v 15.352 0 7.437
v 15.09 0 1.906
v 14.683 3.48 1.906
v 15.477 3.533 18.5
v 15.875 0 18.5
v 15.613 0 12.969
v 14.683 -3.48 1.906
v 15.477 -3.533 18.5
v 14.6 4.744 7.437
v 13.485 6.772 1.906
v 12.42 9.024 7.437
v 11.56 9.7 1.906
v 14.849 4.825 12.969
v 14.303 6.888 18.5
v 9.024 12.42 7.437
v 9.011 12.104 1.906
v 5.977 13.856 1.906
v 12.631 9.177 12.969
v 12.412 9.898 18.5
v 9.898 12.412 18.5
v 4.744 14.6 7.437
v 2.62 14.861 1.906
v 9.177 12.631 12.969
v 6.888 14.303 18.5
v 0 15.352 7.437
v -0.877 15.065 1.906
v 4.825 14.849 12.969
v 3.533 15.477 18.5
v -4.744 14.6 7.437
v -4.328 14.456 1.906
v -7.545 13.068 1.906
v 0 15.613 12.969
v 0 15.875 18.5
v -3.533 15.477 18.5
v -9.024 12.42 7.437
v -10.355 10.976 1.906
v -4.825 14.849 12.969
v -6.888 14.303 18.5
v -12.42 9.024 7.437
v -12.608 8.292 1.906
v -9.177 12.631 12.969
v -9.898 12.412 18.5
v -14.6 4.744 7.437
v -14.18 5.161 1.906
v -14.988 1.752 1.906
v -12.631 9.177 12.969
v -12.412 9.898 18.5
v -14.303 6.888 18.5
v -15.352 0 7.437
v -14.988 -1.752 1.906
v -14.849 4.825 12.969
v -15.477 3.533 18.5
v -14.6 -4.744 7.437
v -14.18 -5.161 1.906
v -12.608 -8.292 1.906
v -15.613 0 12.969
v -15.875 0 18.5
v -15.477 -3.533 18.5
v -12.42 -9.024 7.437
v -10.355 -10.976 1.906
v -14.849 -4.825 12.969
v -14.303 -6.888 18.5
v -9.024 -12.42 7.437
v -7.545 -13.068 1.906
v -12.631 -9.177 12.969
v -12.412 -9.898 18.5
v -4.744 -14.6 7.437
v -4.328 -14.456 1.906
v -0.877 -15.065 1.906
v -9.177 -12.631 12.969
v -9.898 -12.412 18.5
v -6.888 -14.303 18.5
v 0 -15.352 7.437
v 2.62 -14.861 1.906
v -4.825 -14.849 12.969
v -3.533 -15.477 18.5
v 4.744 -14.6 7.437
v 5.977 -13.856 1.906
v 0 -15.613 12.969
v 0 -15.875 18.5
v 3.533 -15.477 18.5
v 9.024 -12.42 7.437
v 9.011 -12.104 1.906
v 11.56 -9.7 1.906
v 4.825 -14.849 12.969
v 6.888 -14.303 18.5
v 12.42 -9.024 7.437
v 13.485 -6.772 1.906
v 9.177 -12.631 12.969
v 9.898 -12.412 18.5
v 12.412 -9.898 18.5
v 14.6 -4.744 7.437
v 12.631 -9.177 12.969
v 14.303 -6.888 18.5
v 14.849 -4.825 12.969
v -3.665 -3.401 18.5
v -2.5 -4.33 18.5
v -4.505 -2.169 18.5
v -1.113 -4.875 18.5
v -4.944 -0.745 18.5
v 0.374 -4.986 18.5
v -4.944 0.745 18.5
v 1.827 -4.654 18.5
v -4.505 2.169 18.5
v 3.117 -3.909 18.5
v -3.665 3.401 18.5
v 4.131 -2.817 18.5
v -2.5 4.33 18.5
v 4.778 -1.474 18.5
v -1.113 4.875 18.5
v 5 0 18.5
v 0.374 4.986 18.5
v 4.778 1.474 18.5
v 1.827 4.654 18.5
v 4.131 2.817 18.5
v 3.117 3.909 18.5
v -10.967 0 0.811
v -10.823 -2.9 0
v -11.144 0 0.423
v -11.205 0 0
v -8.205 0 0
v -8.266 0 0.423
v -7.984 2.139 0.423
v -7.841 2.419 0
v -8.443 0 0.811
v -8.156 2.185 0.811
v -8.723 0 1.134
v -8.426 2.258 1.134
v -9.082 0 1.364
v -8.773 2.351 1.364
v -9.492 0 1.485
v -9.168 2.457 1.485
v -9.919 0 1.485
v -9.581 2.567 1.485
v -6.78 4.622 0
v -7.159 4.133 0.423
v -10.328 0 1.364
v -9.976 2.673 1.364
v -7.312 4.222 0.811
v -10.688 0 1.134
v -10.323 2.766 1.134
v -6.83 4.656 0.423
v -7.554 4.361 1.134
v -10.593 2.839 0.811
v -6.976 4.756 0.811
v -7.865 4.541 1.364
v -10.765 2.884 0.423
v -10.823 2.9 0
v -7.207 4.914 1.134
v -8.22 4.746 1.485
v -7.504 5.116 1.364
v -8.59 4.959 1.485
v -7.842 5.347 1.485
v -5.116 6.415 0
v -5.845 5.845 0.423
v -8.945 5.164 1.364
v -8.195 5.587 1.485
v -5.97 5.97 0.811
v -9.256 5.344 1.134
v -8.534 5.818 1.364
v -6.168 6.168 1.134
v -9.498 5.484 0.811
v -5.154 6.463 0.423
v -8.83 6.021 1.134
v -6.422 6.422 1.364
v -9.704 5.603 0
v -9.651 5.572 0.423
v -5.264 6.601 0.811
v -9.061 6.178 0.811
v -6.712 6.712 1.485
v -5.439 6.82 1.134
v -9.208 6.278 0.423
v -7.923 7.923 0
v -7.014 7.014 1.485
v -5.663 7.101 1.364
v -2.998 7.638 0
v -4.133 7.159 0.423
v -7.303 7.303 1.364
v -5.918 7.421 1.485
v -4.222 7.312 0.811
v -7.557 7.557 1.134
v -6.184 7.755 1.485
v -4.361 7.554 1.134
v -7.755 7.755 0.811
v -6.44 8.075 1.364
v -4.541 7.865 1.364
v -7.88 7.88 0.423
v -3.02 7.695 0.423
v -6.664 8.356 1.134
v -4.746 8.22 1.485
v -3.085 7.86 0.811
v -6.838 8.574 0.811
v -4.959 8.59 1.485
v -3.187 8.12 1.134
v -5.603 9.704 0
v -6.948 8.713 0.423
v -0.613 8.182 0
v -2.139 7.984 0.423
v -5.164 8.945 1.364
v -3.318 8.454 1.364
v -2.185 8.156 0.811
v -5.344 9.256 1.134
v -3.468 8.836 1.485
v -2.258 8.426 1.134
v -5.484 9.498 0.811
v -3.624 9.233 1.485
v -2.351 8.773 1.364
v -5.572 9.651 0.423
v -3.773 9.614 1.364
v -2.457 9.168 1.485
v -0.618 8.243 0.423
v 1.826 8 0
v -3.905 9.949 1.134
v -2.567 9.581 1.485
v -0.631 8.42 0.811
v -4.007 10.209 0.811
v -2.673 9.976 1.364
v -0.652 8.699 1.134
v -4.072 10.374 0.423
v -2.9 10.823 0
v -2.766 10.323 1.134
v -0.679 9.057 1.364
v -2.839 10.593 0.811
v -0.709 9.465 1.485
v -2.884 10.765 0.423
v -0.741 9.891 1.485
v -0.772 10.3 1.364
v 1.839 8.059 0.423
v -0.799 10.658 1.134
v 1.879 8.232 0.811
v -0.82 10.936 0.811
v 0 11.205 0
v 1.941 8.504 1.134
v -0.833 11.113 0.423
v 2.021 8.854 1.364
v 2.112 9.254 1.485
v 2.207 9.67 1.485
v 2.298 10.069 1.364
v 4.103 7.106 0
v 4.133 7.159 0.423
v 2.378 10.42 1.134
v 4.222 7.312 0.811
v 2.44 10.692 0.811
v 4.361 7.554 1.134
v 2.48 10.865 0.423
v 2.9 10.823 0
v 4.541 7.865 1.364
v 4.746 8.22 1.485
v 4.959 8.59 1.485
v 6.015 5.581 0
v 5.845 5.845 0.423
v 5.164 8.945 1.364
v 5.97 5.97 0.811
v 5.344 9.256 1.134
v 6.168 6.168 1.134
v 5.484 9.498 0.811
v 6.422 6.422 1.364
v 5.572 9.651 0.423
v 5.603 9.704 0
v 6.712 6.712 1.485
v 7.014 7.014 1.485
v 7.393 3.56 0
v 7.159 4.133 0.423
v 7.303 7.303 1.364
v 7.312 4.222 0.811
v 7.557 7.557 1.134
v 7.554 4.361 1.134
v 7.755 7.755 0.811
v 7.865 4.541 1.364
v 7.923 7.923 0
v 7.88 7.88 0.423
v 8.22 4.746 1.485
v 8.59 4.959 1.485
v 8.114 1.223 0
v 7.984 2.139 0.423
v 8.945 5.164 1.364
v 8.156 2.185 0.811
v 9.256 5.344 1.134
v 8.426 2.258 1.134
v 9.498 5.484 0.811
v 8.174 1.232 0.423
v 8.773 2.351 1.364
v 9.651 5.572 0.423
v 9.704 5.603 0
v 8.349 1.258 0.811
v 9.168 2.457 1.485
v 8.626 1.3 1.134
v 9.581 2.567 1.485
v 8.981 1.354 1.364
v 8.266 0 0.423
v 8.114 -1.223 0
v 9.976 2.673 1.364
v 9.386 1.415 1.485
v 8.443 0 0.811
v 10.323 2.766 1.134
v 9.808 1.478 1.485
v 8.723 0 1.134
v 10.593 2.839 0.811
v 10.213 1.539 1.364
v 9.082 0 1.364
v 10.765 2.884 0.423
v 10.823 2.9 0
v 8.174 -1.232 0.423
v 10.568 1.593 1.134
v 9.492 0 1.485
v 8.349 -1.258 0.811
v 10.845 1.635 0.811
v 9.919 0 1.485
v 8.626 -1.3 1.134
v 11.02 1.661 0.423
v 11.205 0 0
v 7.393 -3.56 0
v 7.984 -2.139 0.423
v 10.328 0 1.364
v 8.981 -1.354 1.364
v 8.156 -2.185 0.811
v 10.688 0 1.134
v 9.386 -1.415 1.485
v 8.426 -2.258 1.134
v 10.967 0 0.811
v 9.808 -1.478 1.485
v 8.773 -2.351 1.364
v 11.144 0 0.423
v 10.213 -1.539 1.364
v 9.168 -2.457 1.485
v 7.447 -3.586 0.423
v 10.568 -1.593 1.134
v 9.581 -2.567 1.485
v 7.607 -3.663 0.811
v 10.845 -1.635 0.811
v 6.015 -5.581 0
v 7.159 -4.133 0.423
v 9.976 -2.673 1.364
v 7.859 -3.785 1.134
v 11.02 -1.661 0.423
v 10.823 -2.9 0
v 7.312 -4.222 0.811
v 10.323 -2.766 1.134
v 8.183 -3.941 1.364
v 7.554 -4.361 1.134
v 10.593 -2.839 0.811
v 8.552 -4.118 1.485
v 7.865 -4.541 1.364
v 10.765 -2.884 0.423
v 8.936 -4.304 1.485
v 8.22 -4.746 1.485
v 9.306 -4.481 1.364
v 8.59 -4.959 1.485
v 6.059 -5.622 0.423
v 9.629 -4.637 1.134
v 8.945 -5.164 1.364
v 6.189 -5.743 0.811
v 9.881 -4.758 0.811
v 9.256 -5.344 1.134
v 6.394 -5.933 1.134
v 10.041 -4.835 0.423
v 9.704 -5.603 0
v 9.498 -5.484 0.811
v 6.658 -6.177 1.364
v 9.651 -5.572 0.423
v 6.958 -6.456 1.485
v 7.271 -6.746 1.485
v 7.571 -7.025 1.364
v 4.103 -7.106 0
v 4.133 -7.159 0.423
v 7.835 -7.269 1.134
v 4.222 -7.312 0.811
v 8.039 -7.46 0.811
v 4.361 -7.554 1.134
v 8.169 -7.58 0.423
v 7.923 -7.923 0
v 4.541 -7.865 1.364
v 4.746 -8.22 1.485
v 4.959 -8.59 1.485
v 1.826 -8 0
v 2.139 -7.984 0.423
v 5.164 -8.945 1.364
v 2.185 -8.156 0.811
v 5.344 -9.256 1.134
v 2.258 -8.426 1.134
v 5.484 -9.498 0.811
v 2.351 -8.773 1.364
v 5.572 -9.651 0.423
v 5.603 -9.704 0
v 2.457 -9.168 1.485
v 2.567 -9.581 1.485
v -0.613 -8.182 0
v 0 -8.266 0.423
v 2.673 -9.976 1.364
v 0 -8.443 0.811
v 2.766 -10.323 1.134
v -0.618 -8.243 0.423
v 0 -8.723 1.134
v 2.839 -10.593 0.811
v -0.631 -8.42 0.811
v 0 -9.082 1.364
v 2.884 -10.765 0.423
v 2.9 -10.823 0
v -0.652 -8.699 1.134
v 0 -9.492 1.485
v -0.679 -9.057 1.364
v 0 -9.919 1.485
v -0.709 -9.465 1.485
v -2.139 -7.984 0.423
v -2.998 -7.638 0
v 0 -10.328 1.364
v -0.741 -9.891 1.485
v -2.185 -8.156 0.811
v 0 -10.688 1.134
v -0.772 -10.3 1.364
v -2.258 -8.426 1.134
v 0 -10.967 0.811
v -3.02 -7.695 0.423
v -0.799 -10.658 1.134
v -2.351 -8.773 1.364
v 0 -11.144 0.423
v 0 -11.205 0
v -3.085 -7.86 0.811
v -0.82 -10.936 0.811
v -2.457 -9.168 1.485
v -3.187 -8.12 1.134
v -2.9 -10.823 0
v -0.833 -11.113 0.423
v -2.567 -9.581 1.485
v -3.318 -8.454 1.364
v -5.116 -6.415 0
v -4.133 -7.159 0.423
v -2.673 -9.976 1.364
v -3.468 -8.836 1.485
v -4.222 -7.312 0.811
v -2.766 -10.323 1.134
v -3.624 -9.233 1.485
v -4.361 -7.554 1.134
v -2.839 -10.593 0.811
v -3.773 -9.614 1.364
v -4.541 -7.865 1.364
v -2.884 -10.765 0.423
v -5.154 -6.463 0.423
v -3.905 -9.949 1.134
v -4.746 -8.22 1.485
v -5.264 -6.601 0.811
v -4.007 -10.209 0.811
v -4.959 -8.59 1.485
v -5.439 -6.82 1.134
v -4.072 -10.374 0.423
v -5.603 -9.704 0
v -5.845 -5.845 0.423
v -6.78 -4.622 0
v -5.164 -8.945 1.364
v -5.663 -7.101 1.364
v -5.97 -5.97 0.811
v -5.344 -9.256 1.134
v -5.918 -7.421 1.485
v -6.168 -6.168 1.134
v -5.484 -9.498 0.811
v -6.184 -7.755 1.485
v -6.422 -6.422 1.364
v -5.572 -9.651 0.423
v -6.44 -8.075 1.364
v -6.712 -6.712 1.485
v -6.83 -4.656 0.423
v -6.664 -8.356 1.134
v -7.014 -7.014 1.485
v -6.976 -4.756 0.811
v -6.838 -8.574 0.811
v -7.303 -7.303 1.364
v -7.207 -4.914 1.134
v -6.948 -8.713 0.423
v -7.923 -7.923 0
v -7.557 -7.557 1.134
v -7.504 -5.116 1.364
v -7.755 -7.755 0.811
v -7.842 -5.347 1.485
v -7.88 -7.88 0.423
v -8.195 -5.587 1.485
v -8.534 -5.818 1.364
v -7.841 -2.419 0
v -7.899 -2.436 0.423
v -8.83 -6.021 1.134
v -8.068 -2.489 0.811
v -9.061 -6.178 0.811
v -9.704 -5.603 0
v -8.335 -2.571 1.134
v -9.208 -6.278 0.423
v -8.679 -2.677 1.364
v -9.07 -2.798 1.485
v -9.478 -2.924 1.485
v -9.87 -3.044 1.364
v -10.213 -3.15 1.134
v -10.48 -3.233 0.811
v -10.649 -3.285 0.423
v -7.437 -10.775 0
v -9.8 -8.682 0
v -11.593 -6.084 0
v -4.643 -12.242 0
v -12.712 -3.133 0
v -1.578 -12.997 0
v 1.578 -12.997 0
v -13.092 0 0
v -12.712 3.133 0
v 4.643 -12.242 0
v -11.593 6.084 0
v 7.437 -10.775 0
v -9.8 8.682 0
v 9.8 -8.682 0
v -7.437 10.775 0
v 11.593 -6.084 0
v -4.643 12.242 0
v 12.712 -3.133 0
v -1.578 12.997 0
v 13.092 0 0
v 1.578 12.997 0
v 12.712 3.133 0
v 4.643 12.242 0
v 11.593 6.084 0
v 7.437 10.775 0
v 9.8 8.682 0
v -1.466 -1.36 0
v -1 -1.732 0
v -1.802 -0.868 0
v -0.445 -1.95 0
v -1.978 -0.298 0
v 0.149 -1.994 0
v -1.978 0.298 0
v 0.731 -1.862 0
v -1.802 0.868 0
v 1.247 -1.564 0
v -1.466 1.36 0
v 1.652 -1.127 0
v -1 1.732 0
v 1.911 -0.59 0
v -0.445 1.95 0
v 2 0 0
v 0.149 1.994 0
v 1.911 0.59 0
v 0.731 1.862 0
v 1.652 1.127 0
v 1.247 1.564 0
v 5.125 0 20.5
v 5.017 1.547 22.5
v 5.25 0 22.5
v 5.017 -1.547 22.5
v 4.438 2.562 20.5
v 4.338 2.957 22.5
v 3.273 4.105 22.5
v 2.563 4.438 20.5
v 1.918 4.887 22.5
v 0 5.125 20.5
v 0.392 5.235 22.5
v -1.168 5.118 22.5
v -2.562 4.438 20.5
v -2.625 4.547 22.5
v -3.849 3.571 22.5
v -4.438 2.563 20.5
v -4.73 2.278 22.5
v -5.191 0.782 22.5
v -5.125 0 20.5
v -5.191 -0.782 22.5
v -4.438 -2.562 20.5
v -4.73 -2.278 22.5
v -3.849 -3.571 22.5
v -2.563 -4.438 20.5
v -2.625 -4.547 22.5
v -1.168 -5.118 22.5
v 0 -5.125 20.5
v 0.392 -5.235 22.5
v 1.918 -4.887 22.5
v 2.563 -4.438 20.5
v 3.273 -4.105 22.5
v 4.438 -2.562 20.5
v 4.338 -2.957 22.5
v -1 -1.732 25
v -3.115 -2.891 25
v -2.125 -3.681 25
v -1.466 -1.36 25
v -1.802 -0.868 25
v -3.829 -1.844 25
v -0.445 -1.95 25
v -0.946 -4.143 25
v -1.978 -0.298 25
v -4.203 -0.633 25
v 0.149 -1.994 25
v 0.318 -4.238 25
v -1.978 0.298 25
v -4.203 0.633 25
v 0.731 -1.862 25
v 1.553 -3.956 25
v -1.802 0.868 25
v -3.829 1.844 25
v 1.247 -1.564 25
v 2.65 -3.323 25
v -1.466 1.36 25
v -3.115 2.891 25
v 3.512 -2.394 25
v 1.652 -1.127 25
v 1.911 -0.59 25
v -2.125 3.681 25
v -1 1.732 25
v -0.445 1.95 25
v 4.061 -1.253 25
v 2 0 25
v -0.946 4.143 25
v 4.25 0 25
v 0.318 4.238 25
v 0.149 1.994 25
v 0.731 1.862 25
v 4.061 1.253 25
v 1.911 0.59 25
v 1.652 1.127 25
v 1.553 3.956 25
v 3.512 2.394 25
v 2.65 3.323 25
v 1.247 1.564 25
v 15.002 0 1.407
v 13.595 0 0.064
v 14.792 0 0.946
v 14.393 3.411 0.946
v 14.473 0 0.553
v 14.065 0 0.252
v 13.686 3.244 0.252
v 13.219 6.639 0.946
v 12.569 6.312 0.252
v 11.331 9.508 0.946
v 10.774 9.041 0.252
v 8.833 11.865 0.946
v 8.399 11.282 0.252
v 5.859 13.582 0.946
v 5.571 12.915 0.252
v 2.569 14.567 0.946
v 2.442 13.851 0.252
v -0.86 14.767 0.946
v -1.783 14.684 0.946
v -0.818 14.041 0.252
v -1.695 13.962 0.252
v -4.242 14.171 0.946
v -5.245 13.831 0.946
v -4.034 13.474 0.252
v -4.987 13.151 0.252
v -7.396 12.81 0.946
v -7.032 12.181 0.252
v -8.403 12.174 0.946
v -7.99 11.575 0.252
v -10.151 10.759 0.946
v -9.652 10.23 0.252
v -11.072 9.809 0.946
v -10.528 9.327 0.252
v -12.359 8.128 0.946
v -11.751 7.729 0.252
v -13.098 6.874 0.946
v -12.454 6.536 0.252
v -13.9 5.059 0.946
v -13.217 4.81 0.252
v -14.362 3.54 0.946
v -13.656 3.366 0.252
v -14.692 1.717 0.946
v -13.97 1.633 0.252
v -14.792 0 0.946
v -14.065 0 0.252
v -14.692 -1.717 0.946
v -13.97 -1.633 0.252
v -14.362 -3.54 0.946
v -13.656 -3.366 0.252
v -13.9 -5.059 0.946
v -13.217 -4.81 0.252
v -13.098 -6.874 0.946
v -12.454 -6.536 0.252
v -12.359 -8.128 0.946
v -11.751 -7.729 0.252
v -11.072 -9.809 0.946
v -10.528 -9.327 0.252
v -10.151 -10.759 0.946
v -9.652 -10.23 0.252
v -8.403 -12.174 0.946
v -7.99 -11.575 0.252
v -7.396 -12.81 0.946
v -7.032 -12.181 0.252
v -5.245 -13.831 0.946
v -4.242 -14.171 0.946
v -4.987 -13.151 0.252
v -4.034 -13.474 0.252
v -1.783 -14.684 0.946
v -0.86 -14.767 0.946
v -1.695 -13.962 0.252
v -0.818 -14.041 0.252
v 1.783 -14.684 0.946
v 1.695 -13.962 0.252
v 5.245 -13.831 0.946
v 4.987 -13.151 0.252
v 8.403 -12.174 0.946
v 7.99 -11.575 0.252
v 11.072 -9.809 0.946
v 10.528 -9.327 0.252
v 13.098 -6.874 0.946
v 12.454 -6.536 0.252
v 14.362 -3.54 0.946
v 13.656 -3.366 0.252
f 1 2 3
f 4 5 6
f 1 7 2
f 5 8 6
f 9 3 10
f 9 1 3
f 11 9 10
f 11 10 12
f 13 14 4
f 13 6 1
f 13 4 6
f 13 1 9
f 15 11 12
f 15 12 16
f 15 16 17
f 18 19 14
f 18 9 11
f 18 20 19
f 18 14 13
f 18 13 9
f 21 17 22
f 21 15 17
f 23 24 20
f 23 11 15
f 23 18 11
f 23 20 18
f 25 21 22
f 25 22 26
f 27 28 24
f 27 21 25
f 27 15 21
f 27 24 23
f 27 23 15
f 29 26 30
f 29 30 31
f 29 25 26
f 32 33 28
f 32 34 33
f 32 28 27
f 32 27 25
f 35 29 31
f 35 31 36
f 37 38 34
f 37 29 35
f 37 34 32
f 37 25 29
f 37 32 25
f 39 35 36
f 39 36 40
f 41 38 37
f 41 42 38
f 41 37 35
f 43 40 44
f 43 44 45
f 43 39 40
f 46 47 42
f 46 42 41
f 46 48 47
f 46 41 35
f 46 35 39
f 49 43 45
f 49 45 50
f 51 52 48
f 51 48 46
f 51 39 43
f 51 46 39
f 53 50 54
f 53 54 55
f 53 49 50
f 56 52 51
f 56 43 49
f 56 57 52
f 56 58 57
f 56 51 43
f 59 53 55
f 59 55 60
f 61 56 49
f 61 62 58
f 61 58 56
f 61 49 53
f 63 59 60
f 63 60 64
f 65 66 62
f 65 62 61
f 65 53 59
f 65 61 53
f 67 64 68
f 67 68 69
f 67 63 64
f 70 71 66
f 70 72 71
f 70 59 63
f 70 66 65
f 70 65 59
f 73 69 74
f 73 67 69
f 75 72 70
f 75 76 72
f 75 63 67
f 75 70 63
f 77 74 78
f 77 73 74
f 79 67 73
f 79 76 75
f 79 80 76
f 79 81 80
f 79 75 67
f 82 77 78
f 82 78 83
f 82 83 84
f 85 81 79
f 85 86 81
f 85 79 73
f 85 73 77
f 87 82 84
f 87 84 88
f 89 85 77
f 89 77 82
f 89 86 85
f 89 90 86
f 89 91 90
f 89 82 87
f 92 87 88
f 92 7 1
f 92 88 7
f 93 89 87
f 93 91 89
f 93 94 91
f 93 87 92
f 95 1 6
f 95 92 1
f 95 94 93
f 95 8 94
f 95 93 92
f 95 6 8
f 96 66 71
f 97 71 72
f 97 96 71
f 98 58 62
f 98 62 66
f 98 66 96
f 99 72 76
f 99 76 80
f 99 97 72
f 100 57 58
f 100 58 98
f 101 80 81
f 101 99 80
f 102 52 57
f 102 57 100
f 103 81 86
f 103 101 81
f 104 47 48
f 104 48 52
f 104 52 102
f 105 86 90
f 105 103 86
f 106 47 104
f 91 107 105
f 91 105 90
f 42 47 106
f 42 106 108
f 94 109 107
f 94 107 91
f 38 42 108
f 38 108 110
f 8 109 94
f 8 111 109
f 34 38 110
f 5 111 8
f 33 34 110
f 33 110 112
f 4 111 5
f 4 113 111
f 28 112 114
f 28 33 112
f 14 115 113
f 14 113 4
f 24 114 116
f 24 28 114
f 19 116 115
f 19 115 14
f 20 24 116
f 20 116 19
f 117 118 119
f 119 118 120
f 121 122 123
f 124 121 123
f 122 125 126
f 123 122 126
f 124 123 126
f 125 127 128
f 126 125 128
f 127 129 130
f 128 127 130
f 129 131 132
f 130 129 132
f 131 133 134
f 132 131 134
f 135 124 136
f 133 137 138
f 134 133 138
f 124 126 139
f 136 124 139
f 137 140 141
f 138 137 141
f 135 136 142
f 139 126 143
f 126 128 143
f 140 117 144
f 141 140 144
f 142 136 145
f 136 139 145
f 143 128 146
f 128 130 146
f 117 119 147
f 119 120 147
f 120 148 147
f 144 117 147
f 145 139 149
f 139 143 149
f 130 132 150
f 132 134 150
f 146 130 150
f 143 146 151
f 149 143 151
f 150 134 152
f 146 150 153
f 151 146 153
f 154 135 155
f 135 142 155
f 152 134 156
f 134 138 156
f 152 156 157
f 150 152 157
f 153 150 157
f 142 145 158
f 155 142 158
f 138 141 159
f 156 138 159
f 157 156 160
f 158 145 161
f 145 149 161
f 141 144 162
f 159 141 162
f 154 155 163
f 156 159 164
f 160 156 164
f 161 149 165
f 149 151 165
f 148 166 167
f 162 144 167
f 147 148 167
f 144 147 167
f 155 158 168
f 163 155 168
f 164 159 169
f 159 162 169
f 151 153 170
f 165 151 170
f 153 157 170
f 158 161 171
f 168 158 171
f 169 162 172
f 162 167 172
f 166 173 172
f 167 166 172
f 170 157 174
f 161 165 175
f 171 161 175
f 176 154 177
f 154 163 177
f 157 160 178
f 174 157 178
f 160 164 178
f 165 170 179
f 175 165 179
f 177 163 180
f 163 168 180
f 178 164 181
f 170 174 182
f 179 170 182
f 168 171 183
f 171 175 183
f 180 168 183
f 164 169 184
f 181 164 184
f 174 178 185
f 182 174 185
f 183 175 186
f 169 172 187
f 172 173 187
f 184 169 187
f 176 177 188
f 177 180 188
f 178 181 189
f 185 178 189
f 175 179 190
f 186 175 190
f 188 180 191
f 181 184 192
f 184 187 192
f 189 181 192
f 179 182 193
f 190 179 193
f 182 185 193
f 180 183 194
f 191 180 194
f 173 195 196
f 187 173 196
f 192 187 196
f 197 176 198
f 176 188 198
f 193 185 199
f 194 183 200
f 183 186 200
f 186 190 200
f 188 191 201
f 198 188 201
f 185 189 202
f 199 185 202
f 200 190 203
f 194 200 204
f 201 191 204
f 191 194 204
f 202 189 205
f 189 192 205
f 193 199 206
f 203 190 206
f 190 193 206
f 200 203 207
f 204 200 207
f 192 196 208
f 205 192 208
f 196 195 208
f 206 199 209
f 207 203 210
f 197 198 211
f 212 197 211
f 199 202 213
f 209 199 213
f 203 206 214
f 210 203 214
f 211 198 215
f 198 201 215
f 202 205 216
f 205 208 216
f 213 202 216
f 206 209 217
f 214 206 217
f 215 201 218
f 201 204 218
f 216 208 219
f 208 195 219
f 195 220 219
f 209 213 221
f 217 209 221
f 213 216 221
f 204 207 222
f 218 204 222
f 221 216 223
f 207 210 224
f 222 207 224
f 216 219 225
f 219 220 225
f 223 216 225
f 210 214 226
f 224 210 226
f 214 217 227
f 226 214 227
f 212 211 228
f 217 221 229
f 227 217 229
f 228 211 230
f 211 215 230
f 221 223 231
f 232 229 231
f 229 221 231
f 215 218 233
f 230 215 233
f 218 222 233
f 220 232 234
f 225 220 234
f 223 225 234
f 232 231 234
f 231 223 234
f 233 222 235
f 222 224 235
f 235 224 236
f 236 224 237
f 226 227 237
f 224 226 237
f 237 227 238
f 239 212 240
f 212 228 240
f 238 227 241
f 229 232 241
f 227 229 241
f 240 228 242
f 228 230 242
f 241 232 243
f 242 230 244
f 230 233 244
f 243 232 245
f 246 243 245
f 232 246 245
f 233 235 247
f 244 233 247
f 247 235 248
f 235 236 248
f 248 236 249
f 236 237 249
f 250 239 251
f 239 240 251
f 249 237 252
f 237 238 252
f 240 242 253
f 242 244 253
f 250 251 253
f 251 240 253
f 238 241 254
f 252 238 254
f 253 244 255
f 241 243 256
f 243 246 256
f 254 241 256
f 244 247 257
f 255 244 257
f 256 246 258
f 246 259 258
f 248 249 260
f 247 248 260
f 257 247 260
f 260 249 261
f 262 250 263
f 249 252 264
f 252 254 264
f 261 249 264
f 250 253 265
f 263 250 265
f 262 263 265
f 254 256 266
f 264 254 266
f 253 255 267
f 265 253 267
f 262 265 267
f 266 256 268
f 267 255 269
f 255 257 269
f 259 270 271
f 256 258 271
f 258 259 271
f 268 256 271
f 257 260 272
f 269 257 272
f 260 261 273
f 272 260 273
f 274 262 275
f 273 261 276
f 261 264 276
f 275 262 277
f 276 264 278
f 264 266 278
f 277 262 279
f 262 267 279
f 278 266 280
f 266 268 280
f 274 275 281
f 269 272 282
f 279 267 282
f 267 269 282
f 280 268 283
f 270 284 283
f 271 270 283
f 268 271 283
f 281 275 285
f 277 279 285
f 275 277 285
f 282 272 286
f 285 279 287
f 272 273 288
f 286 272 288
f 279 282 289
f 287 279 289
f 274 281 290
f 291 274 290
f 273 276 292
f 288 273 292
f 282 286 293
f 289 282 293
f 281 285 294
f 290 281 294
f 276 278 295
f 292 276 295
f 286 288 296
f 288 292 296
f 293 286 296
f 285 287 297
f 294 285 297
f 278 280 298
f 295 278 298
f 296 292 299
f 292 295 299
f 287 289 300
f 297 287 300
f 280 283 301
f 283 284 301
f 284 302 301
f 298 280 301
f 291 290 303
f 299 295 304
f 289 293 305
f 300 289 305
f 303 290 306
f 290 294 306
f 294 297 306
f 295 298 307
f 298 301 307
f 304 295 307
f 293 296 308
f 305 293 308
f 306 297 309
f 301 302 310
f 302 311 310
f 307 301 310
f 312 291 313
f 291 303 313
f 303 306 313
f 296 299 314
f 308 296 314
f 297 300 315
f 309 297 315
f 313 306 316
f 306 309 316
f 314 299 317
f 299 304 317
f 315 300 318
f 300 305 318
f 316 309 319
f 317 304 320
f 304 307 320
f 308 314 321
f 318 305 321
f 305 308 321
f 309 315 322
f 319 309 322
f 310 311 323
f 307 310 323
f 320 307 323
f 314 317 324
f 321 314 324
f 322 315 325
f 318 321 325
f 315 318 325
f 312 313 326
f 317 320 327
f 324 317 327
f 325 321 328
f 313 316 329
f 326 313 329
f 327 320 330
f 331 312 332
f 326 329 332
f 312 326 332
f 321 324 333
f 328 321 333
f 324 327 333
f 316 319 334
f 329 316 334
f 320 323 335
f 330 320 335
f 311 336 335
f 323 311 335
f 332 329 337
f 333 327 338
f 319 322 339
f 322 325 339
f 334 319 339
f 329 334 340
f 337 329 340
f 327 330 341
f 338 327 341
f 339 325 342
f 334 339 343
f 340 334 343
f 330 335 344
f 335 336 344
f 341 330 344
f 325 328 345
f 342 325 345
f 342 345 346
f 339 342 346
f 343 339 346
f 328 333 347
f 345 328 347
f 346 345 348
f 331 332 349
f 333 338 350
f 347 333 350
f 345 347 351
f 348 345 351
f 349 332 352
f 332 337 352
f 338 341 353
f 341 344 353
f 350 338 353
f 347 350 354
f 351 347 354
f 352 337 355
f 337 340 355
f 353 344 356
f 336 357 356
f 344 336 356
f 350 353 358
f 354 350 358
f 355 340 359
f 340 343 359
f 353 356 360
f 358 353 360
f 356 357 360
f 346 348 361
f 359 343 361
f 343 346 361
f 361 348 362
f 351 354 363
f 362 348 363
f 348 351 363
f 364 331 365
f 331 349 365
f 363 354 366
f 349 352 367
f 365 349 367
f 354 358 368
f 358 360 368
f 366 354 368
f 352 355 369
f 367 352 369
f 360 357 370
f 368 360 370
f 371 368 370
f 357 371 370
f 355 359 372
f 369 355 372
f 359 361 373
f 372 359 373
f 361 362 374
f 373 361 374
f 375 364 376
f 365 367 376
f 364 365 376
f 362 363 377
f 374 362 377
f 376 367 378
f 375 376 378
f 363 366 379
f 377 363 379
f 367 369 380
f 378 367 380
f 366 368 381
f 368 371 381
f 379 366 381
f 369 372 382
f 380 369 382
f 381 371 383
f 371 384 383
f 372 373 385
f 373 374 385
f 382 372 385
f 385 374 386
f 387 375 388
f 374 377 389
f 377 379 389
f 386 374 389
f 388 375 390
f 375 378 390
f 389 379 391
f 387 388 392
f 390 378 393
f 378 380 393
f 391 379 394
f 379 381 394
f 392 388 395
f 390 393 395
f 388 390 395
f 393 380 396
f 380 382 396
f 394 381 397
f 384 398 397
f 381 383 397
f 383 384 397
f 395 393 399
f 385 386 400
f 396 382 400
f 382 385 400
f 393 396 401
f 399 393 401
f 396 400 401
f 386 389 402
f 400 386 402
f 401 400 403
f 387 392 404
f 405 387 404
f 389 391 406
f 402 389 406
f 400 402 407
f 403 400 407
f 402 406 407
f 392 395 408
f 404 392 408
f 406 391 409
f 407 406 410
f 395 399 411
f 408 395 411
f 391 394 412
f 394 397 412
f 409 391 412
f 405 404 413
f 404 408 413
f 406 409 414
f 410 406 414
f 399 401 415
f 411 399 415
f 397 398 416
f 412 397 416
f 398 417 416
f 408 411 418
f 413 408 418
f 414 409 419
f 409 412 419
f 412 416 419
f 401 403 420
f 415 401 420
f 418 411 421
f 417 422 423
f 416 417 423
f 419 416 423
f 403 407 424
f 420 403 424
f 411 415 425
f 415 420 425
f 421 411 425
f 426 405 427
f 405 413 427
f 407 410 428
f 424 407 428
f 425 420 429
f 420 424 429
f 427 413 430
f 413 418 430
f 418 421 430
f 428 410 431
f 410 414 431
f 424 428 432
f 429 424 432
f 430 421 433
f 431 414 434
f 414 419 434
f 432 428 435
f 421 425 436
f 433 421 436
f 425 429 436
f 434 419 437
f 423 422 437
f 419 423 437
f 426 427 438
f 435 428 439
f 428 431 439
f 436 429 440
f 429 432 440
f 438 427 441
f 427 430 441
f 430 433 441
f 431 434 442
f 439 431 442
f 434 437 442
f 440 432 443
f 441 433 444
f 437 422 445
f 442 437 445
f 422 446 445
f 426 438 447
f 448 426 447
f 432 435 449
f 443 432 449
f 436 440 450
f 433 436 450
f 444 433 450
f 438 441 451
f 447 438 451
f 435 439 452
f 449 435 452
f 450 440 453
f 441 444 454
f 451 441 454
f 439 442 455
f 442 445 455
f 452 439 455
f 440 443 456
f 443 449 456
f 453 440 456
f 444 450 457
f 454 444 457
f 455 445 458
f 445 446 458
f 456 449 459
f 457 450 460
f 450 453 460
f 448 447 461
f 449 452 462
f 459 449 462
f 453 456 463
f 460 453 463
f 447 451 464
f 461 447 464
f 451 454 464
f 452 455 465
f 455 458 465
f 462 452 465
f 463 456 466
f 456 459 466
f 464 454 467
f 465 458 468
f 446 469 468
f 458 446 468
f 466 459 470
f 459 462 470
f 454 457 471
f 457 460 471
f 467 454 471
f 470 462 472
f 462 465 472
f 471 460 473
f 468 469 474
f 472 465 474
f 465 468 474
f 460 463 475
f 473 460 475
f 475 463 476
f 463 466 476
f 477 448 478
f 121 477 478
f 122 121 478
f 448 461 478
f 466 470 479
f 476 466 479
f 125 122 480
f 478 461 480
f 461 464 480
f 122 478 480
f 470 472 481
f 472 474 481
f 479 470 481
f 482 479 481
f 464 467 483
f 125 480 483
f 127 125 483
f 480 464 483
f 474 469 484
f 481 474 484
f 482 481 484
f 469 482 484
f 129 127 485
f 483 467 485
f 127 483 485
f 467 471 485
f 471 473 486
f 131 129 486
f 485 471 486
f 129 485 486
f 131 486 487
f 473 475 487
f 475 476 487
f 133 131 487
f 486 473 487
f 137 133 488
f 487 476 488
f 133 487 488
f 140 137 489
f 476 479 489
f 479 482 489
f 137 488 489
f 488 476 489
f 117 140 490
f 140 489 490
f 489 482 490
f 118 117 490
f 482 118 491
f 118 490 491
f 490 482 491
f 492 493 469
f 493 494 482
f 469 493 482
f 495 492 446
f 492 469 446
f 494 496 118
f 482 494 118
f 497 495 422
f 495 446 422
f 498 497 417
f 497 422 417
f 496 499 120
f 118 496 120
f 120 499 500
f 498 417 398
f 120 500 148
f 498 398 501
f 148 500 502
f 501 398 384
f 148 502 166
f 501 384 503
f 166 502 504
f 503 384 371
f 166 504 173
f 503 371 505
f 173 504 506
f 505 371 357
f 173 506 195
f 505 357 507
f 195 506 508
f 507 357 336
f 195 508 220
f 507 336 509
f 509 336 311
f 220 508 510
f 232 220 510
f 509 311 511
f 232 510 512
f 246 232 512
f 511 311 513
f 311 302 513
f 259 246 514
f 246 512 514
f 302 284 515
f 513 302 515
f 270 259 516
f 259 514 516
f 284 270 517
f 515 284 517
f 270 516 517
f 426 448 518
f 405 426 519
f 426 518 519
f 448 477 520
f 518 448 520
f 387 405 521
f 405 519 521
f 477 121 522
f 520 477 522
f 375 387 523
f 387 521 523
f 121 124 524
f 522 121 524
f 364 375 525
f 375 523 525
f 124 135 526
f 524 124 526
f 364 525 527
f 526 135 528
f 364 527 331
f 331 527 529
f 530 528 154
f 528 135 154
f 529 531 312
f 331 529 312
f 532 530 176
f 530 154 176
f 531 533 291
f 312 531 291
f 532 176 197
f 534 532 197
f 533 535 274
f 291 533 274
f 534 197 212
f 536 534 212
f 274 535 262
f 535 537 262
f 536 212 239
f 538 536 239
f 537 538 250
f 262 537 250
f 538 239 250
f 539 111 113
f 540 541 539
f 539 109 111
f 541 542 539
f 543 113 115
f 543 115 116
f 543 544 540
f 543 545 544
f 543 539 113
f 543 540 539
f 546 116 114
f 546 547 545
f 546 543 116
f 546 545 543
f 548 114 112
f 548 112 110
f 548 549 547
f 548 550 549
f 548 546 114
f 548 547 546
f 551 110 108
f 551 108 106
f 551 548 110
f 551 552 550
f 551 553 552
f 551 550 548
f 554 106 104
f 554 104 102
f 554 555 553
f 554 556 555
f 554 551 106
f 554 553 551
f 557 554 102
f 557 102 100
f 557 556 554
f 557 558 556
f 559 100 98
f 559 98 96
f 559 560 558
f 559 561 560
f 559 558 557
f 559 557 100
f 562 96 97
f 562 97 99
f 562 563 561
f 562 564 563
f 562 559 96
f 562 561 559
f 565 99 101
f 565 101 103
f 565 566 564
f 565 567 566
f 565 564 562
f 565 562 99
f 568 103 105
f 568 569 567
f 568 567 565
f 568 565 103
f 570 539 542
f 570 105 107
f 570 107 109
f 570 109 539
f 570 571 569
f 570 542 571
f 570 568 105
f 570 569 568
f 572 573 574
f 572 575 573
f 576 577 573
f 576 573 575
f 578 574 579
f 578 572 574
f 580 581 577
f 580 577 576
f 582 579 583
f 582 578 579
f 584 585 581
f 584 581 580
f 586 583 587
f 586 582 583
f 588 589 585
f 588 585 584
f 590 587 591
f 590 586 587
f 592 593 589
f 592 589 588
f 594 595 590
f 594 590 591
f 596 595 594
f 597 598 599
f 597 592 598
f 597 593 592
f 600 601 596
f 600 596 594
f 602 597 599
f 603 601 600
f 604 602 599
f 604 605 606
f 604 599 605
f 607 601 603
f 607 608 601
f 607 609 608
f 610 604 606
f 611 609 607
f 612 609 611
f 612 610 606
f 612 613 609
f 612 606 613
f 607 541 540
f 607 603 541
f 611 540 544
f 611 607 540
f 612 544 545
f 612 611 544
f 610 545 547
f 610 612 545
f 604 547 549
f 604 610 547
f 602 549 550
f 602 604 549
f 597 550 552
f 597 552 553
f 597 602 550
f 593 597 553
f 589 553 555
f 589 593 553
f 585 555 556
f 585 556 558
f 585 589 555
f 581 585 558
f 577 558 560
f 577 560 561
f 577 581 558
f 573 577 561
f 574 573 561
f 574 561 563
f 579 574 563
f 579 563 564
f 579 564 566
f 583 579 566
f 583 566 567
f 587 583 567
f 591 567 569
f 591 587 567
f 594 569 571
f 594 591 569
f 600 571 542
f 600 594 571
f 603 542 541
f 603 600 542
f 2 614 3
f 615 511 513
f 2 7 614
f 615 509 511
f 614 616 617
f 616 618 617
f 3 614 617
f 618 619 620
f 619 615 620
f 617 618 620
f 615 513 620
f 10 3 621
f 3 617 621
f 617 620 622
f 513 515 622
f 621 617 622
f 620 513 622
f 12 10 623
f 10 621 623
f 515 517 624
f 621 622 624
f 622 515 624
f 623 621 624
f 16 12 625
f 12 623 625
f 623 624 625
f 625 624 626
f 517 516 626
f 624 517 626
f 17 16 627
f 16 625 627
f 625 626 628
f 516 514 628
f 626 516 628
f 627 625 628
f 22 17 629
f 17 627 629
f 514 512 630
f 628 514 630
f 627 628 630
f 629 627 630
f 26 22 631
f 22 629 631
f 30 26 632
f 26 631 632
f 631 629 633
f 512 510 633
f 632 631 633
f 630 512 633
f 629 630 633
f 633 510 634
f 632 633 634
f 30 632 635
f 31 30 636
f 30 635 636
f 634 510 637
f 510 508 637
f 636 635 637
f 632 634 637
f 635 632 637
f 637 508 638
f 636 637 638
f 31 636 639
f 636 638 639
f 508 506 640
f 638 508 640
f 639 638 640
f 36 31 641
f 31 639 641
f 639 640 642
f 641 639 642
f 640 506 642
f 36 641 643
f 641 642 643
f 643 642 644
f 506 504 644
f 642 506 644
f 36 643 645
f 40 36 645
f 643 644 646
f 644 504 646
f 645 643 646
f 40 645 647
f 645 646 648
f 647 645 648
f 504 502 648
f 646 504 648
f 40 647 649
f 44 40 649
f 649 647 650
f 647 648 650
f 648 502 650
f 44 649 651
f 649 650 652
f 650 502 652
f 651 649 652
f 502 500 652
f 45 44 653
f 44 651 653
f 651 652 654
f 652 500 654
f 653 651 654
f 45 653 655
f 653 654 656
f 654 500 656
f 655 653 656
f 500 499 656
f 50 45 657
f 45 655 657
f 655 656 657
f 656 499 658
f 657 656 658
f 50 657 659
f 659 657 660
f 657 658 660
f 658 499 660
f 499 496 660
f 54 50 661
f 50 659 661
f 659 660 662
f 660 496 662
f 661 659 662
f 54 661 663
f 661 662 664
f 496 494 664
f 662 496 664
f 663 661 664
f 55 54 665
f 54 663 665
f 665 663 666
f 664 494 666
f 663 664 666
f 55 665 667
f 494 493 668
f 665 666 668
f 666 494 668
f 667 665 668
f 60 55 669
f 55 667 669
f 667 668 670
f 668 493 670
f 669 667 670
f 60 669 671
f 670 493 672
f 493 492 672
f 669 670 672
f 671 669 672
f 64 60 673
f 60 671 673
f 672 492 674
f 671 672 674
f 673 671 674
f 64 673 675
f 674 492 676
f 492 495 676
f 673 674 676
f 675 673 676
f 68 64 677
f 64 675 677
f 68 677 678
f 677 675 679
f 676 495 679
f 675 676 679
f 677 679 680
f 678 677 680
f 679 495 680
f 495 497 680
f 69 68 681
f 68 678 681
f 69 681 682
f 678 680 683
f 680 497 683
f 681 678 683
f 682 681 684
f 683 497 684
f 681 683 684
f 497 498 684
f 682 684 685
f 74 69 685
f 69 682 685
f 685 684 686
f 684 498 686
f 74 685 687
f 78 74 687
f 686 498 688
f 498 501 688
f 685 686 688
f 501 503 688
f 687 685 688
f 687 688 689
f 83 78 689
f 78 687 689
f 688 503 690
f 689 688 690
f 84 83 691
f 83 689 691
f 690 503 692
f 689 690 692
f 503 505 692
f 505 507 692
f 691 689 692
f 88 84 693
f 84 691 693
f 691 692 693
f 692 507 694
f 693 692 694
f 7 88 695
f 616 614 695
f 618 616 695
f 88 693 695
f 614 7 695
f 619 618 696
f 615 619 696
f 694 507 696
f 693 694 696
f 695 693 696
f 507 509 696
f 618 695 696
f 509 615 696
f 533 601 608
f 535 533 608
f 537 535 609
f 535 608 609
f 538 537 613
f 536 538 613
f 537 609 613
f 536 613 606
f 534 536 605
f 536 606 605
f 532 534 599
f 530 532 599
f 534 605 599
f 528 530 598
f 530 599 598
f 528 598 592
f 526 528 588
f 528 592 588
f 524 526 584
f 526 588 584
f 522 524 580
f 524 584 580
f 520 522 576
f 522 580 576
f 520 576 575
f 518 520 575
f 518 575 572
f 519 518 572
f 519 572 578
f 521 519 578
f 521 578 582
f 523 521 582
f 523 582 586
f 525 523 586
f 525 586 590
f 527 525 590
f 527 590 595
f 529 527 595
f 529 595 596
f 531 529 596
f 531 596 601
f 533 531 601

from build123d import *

# Parameters (mm, degrees)
F0_R      = 15
F2_R      = 15.875
F4_R      = 5
F6_R      = 5.25
F7_FACE_R = 5.25
F9_R      = 4.25
F11_R     = 2
F12_DEPTH = 25.0010001
F13_R     = 1.5
F15_R     = 2


with BuildPart() as f3:
    # F0 (on Top) → F3 section 0
    with BuildSketch(Plane.XY):
        Circle(F0_R)
    # F2 (on offset) → F3 section 1
    with BuildSketch(Plane.XY.offset(18.5)):
        Circle(F2_R)
    loft()

    # F4 (on face) → F7 section 0
    with BuildSketch(Plane.XY.offset(18.5)):
        Circle(F4_R)
    # F6 (on offset) → F7 section 1
    with BuildSketch(Plane.XY.offset(22.5)):
        Circle(F6_R)
    loft()

    # F7_face (on face) → F10 section 0
    with BuildSketch(Plane.XY.offset(22.5)):
        Circle(F7_FACE_R)
    # F9 (on offset) → F10 section 1
    with BuildSketch(Plane.XY.offset(25)):
        Circle(F9_R)
    loft()

    # F11 (on face) → F12 (cut, through all)
    with BuildSketch(Plane.XY.offset(25)):
        Circle(F11_R)
    extrude(amount=-F12_DEPTH, mode=Mode.SUBTRACT)

    # F13 (on Front) → F14 (revolve, cut)
    with BuildSketch(Plane.XZ):
        with Locations((-9.7052594647, 0)):
            Circle(F13_R)
    revolve(axis=Axis((0, 0, 7.5749068208), (0, 0, -1)), mode=Mode.SUBTRACT)

    # F15
    f15_edges = [f3.edges().sort_by_distance(p)[0] for p in [
        (-15, 0, 0),
    ]]
    fillet(f15_edges, radius=F15_R)


solid = f3.part
